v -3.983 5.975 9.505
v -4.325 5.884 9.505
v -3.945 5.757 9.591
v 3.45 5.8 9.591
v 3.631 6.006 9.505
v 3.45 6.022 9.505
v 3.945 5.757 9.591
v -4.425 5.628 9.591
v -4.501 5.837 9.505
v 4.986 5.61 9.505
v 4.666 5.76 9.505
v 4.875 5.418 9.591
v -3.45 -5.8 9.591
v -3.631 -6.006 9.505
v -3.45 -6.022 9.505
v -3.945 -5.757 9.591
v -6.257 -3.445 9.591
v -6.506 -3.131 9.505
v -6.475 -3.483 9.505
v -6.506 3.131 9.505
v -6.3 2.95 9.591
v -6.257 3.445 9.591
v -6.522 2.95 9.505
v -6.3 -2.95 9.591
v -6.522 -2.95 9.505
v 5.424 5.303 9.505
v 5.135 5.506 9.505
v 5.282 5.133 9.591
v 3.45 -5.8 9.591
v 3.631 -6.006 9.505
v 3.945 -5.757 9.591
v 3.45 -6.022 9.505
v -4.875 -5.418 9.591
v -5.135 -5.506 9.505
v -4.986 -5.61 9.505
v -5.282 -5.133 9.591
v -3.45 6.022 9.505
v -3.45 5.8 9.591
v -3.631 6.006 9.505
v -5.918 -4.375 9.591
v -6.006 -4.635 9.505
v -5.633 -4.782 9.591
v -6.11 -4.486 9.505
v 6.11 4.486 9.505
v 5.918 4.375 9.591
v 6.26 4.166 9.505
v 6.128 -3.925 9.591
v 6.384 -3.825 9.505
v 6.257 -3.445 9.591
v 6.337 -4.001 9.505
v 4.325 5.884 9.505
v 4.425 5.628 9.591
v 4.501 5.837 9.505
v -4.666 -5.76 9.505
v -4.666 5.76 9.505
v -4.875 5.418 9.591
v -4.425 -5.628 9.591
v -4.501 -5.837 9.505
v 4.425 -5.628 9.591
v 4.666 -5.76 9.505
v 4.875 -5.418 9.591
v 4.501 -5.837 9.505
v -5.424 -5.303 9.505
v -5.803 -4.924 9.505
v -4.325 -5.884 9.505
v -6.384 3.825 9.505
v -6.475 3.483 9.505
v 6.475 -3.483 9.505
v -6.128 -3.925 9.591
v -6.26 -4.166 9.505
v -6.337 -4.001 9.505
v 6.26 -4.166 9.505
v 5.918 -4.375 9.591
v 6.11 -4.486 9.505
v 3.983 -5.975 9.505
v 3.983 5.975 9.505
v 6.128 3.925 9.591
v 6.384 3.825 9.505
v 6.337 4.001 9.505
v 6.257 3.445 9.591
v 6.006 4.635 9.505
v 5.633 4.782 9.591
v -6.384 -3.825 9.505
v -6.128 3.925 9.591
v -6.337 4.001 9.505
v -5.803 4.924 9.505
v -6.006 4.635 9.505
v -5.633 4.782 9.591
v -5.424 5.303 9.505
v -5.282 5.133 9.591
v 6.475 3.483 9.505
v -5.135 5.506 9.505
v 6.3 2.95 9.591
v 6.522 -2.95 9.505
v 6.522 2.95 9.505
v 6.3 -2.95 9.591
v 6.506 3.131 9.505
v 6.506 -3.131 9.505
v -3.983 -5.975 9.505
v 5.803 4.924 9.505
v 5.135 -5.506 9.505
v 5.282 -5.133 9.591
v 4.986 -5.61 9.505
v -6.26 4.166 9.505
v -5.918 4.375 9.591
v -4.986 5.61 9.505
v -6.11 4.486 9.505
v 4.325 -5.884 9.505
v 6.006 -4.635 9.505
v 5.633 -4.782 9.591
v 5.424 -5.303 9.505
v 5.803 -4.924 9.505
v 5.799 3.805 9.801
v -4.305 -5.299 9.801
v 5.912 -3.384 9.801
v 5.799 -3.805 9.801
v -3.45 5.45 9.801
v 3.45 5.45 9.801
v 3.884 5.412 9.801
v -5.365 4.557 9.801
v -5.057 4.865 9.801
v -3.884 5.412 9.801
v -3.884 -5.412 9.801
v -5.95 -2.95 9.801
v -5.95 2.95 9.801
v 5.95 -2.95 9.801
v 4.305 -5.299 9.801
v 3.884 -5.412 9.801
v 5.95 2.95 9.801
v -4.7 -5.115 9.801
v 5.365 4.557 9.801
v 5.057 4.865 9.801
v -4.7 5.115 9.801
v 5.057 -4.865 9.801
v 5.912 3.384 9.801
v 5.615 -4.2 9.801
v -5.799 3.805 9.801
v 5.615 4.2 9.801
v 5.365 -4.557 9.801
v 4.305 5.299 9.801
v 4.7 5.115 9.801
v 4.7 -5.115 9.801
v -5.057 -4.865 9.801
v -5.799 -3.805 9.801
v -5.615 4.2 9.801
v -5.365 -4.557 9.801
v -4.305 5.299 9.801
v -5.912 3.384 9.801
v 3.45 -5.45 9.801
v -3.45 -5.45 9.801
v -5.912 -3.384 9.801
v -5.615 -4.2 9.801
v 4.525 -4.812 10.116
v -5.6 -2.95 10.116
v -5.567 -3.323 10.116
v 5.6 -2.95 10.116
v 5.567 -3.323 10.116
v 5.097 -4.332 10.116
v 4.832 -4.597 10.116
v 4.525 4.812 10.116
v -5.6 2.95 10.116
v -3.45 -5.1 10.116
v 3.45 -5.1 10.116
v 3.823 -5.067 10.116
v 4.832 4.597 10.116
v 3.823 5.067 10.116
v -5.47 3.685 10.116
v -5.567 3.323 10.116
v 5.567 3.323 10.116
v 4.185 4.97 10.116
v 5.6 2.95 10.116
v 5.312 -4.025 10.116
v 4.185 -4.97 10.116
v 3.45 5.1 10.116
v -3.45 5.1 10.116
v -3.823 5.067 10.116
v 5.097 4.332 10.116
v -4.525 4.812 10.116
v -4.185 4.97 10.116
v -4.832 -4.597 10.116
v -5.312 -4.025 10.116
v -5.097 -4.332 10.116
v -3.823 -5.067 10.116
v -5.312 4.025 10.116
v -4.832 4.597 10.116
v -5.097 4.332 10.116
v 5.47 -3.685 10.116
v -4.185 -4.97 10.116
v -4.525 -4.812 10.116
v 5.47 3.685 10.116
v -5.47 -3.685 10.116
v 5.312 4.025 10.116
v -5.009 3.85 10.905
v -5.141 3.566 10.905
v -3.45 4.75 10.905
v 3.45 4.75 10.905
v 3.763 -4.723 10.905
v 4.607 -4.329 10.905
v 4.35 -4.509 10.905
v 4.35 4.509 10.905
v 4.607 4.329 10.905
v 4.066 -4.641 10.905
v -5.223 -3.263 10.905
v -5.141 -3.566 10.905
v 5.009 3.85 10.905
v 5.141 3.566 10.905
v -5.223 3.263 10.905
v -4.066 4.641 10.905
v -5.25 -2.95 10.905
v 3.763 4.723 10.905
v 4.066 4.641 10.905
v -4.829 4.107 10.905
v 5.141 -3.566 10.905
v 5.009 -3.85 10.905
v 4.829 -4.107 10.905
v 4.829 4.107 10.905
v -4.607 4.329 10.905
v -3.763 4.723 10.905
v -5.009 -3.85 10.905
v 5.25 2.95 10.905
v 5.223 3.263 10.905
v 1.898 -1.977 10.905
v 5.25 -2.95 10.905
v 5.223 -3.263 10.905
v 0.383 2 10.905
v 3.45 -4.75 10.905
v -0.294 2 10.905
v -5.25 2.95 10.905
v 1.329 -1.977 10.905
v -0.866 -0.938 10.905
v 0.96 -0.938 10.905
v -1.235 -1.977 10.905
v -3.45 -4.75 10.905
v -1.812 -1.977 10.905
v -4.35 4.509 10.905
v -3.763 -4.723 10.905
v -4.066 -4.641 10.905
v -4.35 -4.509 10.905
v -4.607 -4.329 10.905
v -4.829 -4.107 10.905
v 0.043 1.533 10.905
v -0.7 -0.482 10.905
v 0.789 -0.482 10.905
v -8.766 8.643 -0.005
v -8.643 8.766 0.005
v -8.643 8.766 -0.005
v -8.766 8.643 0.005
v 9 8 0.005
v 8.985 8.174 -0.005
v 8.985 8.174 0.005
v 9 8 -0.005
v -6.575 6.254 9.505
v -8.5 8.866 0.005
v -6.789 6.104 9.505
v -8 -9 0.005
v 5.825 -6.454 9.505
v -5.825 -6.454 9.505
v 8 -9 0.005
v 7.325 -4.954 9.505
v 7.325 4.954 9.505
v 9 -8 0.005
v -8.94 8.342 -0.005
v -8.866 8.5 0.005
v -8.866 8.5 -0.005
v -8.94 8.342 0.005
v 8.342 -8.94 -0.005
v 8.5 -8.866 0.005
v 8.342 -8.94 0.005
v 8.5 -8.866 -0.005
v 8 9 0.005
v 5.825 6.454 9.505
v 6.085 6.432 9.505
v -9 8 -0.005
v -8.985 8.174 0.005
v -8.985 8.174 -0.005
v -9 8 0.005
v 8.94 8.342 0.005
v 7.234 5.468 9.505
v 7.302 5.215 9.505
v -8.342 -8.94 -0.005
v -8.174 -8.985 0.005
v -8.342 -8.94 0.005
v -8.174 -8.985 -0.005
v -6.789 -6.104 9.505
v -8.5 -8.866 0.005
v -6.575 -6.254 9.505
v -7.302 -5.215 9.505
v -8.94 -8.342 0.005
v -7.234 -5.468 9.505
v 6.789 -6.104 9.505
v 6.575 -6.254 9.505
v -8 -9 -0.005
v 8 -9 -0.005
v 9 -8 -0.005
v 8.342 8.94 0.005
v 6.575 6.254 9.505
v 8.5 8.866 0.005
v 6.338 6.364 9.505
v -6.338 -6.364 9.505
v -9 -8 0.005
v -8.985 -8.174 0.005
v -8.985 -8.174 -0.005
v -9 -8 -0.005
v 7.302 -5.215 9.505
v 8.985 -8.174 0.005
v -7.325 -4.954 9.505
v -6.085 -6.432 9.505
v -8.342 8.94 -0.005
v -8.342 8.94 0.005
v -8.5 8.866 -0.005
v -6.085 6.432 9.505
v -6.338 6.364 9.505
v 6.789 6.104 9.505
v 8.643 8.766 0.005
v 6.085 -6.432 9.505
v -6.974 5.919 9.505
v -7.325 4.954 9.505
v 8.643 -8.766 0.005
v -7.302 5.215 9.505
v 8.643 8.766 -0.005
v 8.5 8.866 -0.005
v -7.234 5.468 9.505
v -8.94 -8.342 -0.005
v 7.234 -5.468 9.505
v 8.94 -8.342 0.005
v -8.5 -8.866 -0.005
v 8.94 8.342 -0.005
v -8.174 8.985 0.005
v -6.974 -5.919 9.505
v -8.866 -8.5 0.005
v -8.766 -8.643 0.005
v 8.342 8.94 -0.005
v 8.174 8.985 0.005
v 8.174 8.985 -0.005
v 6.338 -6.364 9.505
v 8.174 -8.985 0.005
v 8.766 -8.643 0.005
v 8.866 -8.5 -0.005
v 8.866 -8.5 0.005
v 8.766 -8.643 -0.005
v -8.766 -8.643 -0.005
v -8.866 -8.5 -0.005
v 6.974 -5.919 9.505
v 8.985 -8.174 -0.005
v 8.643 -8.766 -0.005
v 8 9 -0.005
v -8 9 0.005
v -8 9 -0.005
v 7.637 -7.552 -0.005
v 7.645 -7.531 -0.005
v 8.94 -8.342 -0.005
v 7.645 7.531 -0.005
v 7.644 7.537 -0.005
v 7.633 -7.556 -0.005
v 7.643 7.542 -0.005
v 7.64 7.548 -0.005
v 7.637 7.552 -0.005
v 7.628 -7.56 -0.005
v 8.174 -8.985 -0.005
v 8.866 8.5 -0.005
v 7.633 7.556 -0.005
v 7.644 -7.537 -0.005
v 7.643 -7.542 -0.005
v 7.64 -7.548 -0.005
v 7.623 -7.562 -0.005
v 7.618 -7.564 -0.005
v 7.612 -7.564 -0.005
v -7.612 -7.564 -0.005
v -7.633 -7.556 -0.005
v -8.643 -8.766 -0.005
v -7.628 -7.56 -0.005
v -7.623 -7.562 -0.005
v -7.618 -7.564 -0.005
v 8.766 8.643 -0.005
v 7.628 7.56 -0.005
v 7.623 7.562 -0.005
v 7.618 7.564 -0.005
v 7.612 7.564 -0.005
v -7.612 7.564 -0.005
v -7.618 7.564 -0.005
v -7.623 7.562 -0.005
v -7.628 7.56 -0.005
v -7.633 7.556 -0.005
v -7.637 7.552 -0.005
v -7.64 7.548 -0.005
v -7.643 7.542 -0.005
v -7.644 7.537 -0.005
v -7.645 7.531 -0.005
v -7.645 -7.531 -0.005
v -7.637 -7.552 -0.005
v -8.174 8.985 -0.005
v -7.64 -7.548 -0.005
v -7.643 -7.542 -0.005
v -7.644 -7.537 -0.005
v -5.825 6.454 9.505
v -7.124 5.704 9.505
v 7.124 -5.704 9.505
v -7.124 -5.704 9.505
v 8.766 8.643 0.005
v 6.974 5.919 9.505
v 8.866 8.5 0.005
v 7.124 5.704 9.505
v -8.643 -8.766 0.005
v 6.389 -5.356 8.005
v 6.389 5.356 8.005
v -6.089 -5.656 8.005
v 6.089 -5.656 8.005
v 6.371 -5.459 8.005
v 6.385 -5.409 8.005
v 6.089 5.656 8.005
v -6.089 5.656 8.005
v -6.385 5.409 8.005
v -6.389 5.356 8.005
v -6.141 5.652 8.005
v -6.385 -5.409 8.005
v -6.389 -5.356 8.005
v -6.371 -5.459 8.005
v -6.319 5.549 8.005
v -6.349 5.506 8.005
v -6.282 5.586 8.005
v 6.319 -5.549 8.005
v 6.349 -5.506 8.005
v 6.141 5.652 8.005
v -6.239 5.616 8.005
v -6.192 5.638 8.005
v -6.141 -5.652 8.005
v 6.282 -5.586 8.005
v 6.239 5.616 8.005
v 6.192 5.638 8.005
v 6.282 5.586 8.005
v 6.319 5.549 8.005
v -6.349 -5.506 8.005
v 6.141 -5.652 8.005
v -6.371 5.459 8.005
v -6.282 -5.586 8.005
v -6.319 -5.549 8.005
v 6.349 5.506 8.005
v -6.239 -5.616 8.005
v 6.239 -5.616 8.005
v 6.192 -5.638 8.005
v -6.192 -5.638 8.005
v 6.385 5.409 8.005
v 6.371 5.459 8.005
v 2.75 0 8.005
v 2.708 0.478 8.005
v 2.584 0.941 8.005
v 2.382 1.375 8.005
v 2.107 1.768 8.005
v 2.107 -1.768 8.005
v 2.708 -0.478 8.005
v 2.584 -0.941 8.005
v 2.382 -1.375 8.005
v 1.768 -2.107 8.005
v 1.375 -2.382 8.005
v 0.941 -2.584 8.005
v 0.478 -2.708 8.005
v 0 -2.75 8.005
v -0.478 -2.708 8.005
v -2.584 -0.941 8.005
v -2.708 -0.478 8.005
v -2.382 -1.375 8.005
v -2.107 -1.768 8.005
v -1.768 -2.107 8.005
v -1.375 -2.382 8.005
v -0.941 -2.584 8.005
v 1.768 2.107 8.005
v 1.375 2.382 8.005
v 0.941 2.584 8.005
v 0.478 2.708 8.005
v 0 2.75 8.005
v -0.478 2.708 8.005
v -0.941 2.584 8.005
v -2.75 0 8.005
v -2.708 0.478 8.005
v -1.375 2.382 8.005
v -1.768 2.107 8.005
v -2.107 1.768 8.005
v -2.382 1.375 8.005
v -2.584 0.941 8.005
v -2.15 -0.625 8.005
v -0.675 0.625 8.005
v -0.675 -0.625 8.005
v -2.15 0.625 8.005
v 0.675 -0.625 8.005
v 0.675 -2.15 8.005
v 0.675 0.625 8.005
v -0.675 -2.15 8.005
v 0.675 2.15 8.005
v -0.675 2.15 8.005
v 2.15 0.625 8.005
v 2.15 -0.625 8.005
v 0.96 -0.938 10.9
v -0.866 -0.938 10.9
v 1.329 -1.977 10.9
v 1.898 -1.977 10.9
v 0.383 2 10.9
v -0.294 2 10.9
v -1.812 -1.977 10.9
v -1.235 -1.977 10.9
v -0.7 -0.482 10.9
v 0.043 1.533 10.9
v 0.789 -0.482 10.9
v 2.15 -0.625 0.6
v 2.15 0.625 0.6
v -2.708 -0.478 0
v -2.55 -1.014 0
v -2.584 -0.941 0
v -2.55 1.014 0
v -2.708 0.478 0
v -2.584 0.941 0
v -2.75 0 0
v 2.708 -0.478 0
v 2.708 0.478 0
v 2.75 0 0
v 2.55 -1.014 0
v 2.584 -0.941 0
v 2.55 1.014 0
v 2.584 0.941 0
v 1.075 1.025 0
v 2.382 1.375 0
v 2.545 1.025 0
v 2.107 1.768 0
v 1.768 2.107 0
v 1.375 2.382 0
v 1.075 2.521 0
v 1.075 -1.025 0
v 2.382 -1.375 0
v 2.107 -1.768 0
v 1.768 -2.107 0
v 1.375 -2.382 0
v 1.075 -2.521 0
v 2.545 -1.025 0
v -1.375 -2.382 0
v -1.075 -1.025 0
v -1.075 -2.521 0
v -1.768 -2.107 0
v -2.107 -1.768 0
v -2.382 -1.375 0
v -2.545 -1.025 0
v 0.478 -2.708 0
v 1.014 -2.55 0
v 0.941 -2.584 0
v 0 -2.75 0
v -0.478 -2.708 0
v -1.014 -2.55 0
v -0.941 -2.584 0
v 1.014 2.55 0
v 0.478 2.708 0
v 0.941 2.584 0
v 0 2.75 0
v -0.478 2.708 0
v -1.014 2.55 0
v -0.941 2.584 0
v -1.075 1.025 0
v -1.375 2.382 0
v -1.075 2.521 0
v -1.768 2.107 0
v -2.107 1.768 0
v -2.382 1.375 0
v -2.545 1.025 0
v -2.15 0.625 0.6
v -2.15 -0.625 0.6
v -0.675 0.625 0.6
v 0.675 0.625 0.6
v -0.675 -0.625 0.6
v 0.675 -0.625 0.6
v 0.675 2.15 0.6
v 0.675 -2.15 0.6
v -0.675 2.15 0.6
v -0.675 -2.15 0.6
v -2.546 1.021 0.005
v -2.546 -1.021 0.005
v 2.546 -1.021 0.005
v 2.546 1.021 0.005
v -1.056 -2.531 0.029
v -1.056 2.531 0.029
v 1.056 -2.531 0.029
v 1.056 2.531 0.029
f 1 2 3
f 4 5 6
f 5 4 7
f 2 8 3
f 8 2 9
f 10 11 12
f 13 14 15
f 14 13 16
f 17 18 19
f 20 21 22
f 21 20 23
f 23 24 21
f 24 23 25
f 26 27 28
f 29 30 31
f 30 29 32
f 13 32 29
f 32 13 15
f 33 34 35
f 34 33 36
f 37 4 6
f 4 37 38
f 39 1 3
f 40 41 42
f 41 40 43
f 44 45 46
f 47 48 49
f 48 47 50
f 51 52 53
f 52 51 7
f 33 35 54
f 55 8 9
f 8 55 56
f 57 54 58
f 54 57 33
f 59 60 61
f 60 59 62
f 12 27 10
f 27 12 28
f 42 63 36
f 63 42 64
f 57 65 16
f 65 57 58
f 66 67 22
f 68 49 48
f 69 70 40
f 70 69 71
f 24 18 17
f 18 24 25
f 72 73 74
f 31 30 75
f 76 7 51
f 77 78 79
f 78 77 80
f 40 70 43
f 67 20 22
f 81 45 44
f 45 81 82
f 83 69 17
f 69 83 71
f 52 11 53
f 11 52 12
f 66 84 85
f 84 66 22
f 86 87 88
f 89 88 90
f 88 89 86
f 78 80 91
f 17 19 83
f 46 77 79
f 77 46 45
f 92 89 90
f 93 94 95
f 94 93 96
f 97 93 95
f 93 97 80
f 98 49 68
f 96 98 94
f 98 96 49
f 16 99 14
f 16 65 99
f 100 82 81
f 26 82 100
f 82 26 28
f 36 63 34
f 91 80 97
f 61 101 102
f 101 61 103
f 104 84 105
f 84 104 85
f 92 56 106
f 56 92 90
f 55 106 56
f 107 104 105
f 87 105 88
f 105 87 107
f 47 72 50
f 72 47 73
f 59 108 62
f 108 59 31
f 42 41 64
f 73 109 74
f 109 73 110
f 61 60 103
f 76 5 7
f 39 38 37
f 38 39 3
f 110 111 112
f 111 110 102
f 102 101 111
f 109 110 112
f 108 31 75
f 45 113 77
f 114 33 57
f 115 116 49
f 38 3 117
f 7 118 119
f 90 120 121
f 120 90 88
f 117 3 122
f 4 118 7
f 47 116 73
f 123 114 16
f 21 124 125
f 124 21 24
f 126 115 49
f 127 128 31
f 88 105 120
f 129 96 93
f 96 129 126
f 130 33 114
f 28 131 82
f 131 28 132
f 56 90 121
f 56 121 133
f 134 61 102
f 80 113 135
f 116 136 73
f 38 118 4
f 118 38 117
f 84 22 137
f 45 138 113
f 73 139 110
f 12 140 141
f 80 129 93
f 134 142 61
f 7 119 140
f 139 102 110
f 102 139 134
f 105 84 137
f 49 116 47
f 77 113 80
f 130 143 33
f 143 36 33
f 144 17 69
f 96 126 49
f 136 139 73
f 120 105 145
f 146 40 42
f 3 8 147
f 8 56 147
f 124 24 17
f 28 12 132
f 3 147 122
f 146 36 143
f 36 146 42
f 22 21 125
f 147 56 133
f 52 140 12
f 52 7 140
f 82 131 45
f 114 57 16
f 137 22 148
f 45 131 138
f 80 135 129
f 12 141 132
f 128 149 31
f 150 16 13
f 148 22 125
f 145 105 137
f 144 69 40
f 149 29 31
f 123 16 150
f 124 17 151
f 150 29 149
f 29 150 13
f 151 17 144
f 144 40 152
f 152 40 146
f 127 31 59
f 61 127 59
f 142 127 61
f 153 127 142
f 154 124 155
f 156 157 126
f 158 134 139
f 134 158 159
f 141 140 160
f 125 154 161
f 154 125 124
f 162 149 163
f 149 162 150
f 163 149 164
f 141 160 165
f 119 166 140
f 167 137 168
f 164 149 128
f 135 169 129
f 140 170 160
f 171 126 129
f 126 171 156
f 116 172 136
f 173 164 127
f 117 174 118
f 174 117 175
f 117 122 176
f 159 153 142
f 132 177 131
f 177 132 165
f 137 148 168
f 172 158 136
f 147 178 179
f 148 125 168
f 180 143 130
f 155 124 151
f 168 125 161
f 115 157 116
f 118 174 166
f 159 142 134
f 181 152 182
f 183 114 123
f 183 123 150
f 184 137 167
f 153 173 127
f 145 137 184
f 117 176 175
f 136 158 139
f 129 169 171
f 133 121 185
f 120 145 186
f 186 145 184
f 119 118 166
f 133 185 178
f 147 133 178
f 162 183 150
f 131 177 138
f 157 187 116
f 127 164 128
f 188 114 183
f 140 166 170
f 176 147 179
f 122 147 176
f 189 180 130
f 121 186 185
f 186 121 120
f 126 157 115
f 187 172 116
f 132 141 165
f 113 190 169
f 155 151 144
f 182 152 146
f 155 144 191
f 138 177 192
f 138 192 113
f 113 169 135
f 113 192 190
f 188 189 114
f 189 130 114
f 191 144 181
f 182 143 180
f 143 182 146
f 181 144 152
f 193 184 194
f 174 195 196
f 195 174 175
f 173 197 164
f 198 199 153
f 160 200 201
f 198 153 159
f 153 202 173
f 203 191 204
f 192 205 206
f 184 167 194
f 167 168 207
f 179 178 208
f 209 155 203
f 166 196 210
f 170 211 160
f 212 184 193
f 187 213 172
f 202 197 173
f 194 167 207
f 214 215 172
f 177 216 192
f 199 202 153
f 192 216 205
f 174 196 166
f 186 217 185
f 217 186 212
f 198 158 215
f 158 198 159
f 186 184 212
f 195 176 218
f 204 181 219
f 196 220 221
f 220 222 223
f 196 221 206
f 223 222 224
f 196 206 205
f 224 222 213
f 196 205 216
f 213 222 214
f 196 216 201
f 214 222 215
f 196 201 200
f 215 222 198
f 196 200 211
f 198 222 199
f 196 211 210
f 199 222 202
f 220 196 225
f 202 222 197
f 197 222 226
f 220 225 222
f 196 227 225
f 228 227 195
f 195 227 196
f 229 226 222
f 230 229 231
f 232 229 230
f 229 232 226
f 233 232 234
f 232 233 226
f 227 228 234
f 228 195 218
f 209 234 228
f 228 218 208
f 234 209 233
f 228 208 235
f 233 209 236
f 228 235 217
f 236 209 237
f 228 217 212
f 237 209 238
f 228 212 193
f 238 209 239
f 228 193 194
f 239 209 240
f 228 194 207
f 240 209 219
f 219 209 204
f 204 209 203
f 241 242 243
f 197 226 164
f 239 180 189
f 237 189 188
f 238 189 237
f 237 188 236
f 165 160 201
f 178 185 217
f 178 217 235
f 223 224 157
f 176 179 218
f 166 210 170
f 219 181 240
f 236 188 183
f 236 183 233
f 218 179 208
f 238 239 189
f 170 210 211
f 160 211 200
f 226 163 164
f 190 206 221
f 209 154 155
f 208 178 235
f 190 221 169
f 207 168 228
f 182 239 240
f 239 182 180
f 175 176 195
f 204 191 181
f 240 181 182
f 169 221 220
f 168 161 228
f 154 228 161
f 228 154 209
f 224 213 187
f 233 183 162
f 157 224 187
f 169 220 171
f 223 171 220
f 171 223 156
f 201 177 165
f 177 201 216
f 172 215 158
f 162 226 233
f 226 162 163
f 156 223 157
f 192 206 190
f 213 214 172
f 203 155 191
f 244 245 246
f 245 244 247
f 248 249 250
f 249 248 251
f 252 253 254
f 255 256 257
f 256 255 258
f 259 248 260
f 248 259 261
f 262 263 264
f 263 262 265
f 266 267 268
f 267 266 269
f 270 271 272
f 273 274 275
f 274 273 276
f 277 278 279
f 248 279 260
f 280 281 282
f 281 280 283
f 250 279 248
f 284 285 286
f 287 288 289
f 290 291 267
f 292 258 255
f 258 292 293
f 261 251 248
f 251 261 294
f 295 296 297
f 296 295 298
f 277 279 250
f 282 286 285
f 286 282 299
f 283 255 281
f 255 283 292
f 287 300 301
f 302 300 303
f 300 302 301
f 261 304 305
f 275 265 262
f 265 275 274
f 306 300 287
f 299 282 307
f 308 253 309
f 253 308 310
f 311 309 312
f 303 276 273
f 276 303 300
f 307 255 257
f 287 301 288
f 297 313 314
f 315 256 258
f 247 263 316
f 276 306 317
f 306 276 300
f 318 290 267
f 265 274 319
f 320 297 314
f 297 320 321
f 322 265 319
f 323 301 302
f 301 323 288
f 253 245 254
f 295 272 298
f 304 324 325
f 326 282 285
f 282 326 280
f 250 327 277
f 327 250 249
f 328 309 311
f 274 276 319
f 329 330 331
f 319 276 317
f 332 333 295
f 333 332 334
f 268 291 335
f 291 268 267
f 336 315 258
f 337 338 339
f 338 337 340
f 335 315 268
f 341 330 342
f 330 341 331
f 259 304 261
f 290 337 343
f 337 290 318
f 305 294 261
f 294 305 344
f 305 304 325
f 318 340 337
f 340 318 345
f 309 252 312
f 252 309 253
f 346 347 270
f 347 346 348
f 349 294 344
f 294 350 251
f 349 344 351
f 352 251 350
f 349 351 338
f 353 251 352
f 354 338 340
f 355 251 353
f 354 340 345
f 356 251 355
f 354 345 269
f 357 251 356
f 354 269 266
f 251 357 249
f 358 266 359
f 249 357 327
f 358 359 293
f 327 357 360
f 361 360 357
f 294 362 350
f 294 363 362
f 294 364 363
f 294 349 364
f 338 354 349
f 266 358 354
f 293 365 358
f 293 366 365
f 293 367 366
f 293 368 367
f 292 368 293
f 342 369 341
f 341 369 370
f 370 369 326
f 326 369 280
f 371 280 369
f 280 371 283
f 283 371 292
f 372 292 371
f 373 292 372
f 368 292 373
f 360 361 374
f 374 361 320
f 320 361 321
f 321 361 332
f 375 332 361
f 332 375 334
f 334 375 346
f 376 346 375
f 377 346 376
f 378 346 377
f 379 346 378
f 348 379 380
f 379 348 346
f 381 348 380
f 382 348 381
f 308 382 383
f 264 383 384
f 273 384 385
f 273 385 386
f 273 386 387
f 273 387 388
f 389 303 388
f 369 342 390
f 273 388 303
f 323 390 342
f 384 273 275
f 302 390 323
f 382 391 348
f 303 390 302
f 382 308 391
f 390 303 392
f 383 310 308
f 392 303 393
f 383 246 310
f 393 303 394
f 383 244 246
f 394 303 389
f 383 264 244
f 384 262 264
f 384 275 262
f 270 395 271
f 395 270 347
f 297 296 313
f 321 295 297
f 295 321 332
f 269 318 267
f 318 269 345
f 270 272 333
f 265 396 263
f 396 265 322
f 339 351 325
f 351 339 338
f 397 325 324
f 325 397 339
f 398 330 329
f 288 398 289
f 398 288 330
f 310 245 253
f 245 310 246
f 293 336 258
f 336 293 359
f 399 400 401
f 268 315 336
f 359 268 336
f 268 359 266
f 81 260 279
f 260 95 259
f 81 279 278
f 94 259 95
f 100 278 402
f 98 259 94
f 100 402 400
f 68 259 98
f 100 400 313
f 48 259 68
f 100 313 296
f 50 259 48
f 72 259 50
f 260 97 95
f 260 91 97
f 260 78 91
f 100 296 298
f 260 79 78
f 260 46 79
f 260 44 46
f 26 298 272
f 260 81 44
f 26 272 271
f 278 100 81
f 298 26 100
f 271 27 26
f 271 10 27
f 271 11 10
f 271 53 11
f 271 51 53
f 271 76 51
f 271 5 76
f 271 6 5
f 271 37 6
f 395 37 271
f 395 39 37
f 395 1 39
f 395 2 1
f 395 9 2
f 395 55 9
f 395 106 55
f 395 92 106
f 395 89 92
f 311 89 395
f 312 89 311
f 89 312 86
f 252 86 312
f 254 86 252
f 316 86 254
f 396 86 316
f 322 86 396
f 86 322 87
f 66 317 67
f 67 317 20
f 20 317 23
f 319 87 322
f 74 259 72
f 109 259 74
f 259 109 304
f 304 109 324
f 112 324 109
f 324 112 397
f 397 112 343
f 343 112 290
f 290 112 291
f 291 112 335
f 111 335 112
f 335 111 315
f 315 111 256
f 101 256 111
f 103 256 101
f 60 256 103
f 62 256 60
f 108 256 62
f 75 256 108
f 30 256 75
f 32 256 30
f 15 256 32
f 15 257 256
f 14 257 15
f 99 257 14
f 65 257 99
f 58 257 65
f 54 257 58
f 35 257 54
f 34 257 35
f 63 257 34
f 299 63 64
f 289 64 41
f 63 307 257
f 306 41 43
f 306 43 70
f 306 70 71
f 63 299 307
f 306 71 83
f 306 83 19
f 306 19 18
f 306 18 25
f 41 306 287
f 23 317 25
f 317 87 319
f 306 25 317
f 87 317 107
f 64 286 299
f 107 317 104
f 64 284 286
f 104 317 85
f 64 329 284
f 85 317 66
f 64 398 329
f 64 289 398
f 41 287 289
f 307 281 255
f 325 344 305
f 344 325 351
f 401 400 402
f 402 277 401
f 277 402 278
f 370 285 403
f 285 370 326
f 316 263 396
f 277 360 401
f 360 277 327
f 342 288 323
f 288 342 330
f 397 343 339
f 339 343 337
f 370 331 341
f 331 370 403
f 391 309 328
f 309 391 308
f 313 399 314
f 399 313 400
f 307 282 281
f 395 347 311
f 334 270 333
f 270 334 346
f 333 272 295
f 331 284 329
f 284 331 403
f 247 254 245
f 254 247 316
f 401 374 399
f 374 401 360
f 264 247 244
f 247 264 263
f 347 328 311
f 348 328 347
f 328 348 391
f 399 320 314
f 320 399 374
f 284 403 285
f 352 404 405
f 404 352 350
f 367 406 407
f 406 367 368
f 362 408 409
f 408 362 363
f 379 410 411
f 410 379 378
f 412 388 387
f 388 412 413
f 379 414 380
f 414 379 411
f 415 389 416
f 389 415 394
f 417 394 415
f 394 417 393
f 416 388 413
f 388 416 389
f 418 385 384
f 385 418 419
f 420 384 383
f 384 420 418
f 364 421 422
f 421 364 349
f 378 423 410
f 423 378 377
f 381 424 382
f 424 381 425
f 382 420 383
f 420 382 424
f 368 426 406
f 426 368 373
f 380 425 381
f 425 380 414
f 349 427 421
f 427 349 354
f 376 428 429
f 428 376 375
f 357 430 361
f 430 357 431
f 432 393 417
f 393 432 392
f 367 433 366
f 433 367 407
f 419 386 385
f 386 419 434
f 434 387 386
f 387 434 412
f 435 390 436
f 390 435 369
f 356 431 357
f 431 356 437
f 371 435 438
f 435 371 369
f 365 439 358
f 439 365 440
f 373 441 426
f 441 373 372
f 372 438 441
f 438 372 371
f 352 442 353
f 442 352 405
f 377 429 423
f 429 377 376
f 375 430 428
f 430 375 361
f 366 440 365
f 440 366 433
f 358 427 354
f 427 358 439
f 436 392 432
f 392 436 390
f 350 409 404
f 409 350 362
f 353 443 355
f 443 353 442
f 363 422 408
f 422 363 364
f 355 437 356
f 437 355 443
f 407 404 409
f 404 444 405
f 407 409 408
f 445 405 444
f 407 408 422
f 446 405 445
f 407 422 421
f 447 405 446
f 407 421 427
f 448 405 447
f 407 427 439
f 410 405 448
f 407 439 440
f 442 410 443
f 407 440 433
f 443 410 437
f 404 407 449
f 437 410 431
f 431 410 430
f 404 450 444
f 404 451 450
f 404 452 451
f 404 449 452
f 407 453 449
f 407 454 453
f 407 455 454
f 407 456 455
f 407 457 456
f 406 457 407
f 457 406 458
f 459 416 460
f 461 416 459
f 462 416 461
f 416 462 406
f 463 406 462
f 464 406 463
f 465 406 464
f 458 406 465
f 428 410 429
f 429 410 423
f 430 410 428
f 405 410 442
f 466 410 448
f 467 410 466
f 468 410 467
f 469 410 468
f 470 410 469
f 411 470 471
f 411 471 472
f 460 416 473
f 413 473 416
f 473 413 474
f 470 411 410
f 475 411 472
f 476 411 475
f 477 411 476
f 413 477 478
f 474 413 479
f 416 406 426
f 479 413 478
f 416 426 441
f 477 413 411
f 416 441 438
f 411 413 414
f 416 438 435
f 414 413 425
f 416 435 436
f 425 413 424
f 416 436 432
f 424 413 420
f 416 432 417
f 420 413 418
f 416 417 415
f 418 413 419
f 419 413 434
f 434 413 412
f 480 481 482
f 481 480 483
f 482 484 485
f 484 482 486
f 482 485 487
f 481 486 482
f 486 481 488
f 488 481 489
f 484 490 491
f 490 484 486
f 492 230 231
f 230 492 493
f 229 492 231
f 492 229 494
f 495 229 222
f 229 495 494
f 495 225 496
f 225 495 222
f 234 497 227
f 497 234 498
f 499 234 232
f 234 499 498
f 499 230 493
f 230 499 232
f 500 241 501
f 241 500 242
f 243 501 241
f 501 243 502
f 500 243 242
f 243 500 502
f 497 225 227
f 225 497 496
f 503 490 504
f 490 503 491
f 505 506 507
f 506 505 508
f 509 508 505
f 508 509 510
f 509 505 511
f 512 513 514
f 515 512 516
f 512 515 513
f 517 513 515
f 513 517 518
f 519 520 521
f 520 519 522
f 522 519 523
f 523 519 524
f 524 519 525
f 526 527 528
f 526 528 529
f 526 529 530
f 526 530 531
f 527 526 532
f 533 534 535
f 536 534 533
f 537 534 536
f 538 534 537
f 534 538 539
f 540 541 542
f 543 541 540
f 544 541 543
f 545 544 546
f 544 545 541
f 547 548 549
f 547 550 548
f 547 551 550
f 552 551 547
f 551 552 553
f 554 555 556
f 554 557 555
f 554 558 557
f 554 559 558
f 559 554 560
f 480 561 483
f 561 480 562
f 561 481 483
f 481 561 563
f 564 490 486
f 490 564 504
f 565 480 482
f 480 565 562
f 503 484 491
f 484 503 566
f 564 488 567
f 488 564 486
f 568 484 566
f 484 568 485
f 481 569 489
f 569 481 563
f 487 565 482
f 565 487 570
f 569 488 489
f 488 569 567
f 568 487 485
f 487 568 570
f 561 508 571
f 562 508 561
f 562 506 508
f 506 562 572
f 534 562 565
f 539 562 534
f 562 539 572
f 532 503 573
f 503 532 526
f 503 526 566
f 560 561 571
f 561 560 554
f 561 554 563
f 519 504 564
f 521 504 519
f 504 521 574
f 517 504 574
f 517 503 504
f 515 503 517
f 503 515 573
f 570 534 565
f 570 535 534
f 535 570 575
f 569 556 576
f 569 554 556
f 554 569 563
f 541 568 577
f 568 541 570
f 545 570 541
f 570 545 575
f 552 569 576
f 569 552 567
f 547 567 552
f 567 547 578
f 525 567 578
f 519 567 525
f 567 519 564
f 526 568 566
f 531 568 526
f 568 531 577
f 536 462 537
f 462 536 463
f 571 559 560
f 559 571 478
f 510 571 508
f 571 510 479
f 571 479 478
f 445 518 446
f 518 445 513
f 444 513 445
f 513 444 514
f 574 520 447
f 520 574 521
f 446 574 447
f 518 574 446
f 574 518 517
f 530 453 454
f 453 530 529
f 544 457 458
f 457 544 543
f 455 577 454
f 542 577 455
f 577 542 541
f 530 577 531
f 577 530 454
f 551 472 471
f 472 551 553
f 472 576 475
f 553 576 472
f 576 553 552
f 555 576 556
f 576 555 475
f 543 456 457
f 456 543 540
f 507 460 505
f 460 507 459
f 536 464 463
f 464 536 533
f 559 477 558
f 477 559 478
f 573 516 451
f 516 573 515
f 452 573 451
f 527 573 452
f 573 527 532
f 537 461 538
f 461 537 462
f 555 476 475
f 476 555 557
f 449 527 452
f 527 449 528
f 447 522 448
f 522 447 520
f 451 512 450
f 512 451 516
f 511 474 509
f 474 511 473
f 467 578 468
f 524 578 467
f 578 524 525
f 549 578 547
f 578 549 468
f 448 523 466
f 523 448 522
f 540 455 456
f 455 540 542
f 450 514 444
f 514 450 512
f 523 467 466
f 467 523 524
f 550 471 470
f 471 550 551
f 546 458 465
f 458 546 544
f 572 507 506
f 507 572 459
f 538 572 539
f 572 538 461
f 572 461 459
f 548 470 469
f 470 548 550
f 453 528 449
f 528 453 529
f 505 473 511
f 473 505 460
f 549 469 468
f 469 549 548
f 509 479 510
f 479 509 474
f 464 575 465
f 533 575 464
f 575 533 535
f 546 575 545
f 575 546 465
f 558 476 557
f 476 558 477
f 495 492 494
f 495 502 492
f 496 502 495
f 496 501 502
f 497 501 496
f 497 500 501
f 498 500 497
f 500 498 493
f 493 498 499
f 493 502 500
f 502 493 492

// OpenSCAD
export_target = "preview";
include <common/custom-shell-params.scad>

user_top_hat_enabled = true;
user_top_hat_top_width = 10.5;
user_top_hat_top_depth = 9.5;
user_top_hat_top_radius = 1.8;
user_top_hat_height = 1.4;
user_top_hat_shoulder_angle = 45;
user_top_hat_shoulder_radius = -1.0;

include <../base/keycap.scad>
